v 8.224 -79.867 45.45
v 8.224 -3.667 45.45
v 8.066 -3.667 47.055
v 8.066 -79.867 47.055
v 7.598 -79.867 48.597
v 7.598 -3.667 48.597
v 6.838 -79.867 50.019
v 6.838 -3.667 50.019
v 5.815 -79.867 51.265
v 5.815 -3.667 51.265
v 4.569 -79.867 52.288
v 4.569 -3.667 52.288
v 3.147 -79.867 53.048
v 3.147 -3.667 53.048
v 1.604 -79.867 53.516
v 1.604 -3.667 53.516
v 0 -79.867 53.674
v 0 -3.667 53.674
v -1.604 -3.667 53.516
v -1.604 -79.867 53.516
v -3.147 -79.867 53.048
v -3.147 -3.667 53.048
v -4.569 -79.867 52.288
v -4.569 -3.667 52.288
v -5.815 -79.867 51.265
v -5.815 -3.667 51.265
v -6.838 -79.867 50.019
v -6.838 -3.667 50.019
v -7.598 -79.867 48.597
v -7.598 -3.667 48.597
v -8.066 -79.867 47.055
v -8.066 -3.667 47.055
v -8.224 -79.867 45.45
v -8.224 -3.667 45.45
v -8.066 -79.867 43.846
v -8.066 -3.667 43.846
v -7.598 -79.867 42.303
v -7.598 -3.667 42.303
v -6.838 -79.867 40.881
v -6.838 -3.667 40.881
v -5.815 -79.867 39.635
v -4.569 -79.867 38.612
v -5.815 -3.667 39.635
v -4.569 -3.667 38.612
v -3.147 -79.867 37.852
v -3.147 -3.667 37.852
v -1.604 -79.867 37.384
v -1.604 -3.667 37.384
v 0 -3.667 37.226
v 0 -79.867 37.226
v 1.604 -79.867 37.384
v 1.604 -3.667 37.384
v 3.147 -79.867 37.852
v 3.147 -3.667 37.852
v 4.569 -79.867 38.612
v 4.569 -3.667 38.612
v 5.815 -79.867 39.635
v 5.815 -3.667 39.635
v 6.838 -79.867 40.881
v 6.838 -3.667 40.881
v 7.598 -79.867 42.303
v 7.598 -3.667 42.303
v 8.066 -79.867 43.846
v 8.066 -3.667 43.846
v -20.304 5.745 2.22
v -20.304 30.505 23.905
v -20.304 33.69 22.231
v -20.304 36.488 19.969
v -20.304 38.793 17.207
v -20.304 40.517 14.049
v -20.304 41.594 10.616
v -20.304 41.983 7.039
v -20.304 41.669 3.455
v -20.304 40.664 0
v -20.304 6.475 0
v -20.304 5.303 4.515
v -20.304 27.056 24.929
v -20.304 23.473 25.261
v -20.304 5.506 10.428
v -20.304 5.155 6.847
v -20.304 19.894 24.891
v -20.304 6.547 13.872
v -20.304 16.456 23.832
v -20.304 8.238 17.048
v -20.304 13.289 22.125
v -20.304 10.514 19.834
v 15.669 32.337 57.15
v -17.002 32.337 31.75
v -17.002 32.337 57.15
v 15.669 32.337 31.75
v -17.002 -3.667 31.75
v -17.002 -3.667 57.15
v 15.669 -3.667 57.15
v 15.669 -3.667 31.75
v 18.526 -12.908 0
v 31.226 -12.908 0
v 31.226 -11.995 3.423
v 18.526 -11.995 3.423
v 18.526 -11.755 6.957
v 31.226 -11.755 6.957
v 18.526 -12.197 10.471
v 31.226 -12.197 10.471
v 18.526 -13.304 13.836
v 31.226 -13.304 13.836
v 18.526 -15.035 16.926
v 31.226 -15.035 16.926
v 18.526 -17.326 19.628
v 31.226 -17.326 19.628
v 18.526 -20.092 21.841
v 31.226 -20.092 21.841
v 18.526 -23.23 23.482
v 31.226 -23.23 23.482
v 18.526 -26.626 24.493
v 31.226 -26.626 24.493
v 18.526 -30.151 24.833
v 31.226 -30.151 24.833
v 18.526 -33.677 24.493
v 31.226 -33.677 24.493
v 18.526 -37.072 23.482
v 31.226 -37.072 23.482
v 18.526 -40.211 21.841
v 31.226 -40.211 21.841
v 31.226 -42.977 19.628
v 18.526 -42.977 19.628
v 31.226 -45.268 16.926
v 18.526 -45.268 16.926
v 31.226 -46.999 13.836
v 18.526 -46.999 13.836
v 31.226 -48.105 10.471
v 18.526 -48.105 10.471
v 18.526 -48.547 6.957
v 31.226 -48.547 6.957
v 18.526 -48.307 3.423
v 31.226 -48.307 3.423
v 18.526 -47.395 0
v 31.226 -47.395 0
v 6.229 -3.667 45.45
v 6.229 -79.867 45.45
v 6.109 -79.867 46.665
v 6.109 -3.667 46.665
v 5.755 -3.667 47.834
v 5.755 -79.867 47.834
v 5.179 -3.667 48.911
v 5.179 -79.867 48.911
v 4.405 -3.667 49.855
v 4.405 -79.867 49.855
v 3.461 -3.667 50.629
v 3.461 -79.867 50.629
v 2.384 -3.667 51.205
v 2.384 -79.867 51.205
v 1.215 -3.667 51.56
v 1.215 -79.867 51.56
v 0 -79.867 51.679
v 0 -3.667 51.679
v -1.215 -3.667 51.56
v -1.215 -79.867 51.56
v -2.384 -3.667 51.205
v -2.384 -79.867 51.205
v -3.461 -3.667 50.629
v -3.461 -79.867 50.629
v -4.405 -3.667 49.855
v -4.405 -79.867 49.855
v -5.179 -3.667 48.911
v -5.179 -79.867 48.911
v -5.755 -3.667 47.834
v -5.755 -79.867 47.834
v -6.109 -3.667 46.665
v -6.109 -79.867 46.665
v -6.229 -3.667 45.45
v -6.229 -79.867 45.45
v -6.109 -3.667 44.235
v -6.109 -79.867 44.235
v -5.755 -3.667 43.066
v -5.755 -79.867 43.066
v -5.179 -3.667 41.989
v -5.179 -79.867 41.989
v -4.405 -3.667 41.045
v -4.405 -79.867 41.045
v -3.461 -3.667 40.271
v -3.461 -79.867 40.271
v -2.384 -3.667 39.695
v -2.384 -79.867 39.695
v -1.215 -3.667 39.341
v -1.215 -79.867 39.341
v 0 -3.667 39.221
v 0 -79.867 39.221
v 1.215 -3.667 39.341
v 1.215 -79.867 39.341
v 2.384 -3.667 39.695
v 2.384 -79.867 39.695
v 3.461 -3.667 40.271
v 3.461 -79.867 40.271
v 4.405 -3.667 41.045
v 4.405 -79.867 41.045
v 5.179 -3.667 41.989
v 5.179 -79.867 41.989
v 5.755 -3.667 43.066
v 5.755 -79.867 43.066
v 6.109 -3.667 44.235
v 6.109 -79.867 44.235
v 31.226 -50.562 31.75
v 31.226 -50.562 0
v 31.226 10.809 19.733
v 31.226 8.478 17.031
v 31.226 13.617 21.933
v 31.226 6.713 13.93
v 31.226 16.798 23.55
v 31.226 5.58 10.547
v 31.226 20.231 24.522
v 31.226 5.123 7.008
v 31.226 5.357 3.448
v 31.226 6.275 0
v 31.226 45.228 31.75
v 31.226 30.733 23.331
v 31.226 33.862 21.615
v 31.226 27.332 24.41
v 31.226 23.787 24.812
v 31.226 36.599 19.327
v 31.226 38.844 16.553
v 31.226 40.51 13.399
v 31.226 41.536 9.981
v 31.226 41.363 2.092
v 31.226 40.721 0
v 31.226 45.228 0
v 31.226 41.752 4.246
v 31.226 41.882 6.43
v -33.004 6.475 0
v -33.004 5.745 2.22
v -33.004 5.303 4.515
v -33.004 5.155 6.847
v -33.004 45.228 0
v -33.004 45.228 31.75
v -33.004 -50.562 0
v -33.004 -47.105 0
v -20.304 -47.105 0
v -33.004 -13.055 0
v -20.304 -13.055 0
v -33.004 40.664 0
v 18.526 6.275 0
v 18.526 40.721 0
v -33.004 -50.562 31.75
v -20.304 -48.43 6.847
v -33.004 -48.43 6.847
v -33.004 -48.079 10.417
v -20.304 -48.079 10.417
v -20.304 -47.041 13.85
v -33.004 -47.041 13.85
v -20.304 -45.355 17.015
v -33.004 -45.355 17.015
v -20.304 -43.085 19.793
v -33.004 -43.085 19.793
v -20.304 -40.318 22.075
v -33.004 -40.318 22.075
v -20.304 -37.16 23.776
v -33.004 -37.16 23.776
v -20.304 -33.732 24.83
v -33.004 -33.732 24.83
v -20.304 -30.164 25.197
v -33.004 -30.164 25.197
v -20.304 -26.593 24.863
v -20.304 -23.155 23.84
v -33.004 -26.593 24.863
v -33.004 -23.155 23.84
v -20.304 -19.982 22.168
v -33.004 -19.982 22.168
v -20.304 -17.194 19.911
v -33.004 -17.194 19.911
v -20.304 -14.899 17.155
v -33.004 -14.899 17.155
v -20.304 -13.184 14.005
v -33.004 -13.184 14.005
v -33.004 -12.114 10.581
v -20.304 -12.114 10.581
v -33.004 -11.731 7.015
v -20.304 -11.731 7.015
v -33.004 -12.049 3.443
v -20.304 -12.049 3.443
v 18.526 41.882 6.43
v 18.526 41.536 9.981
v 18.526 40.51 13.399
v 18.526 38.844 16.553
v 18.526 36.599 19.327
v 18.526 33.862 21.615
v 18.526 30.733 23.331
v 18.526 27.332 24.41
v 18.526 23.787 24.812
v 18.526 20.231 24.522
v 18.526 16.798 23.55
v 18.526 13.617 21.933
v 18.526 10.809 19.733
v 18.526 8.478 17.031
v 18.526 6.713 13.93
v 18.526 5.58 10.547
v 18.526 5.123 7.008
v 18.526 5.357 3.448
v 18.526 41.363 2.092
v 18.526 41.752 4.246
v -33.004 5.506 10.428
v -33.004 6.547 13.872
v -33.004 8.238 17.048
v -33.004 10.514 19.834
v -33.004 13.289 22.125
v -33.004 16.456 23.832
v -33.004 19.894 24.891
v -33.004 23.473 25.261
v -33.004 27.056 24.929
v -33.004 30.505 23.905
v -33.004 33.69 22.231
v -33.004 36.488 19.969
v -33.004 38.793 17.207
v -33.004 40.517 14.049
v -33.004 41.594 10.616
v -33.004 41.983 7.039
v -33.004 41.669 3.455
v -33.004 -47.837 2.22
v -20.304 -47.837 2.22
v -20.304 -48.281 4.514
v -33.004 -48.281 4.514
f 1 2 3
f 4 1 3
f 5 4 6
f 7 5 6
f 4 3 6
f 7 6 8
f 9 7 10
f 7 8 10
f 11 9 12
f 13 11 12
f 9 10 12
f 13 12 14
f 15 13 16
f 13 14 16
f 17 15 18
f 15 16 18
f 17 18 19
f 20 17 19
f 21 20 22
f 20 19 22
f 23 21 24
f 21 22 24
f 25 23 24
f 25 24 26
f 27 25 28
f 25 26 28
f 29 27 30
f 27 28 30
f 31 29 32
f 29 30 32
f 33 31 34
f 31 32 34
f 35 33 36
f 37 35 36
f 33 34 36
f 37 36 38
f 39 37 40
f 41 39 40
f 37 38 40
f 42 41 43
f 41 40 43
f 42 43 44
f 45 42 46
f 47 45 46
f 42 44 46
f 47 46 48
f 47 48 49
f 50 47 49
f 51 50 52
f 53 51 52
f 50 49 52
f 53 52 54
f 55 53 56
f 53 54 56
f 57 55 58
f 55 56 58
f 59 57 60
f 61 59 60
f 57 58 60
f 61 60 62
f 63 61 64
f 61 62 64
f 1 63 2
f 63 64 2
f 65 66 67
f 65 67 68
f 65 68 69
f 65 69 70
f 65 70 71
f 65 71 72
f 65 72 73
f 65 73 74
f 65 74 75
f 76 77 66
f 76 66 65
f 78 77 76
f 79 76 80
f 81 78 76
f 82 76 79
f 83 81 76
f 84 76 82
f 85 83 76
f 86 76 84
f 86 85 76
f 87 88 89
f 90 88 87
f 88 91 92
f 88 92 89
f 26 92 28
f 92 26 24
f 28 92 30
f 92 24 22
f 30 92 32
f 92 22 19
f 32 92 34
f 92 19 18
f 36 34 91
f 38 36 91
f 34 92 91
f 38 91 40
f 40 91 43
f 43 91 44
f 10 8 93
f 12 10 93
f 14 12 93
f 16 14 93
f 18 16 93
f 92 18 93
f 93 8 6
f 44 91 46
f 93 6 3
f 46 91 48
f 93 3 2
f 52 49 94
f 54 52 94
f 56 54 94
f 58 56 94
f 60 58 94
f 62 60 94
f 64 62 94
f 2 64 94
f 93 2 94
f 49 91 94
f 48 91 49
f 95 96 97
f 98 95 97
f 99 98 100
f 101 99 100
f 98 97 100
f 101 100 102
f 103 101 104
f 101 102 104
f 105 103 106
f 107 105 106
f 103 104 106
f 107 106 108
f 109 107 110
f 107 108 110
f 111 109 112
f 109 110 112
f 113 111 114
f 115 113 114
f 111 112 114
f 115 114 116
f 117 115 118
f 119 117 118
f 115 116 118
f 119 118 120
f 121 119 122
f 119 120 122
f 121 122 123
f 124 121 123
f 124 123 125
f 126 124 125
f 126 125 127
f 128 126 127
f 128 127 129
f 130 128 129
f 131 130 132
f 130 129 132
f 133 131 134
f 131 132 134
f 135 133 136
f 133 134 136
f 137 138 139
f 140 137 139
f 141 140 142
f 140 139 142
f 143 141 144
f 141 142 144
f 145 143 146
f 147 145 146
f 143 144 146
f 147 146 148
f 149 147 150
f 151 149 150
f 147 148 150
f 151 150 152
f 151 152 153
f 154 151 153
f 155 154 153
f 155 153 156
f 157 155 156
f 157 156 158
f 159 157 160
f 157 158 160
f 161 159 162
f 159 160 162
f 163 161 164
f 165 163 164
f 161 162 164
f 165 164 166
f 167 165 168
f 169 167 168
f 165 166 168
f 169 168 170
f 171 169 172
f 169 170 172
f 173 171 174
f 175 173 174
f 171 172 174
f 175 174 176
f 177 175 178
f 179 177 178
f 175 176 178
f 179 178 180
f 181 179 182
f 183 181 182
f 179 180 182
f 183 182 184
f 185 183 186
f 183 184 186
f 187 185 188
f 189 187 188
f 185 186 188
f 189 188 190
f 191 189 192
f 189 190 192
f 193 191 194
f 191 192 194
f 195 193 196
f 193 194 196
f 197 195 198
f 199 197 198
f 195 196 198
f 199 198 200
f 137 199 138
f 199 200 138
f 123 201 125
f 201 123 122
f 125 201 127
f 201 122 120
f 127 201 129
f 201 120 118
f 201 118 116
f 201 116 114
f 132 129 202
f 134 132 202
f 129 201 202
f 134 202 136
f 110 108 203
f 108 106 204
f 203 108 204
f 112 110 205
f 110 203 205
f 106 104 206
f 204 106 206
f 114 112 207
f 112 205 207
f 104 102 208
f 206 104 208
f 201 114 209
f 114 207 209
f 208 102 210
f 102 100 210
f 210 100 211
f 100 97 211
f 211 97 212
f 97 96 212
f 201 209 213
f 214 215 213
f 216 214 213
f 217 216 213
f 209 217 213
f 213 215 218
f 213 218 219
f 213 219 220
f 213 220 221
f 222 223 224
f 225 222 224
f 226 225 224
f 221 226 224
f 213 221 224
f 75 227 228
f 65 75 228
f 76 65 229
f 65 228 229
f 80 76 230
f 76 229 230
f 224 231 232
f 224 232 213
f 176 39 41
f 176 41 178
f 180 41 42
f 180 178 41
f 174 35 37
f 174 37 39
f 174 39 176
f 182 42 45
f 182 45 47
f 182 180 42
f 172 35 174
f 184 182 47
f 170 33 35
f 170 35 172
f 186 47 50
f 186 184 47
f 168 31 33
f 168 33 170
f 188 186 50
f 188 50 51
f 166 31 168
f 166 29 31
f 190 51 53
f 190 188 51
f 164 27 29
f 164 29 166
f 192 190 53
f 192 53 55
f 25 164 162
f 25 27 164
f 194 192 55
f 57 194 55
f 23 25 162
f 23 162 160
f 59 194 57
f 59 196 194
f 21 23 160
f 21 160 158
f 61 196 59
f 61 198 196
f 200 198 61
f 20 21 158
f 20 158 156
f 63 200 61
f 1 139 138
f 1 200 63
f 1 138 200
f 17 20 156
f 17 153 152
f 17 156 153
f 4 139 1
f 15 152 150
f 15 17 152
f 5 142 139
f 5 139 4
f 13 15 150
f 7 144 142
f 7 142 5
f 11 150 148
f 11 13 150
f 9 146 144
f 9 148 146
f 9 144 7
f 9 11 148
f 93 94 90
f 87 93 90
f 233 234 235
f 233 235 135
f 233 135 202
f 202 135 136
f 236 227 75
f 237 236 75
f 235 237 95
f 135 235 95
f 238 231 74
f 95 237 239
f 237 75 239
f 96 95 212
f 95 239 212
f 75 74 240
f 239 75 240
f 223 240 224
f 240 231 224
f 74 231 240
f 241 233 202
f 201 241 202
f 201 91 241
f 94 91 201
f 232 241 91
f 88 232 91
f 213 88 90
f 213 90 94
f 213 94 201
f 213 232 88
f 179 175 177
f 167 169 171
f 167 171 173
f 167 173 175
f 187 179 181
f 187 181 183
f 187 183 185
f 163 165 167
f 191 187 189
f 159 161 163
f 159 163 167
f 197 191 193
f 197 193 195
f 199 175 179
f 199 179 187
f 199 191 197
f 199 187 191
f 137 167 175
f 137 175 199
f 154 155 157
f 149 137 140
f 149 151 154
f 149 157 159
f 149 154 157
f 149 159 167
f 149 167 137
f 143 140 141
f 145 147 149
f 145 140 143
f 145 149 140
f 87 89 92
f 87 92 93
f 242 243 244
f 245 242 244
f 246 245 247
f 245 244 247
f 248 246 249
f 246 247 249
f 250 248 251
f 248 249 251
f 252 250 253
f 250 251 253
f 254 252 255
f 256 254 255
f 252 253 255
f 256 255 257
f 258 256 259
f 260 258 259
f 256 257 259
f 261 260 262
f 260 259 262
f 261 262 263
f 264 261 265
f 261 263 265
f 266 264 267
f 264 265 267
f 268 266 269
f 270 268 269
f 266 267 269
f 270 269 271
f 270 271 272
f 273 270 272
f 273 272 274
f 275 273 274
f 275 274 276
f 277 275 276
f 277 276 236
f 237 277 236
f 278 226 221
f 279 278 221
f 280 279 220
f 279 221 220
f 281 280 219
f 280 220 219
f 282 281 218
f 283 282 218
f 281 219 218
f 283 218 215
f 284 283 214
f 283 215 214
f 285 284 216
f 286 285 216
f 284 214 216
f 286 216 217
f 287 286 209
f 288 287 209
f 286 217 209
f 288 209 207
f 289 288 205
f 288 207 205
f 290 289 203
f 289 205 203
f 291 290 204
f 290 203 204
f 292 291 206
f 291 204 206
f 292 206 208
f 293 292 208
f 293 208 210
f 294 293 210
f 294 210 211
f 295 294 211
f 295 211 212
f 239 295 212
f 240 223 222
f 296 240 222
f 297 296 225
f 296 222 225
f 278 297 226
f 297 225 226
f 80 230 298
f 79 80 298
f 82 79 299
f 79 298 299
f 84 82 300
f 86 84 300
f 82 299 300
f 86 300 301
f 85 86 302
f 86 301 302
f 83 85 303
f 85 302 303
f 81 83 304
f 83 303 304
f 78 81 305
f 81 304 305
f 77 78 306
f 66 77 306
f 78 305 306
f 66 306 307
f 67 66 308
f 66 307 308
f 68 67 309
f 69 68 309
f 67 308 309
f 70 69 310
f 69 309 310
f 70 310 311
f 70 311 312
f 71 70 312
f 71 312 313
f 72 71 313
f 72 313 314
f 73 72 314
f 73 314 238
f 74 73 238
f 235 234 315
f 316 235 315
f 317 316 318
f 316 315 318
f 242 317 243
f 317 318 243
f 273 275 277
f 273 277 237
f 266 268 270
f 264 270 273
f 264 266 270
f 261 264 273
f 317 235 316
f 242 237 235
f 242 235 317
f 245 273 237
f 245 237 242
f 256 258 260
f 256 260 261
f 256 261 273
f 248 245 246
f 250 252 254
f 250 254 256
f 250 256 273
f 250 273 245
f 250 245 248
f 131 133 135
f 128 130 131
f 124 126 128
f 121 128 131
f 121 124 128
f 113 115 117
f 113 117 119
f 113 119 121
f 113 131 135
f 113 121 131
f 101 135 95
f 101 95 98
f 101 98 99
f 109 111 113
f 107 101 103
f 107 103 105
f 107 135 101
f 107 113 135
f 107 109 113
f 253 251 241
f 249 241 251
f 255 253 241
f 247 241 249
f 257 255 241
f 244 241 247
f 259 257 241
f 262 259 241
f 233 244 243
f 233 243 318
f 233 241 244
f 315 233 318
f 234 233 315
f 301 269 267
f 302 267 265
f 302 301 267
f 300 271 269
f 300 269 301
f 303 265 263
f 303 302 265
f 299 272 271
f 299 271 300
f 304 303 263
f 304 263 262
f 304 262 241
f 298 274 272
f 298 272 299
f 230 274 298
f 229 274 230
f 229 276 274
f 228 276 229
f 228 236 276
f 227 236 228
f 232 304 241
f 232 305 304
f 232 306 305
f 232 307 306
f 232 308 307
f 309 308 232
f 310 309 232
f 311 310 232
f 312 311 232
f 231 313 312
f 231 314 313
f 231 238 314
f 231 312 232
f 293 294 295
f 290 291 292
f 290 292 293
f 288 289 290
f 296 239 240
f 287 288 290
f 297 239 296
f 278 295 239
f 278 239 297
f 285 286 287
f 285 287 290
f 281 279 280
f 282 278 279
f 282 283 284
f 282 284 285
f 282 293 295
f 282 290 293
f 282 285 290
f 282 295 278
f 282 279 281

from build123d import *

# Parameters (mm, degrees)
F0_W      = 64.230248332
F0_H      = 95.7897491753
F1_DEPTH  = 31.75
F4_DEPTH  = 12.7
F5_DEPTH  = 12.7
F6_W      = 32.6707493514
F6_H      = 36.0044999979
F7_DEPTH  = 25.4
F8_R      = 8.2239975994
F9_DEPTH  = 76.2
F10_R     = 6.2290995739
F11_DEPTH = 76.2


with BuildPart() as f1:
    # F0 (on Top) → F1 (new body)
    with BuildSketch(Plane.XY):
        with Locations((-0.8889995515, -2.6670005172)):
            Rectangle(F0_W, F0_H)
    extrude(amount=F1_DEPTH)

    # F2 (on face) → F4 (cut)
    with BuildSketch(Plane.YZ.offset(31.2261246145)):
        with BuildLine():
            Line((-47.3948020572, 0), (-12.907678998, 0))
            ThreePointArc((-12.907678998, 0), (-30.1512405276, 24.8333887155), (-47.3948020572, 0))
        make_face()
        with BuildLine():
            ThreePointArc((40.7211401539, 0), (41.5896545425, 3.1629956827), (41.8822641726, 6.4299879596))
            ThreePointArc((41.8822641726, 6.4299879596), (20.2309505583, 24.521699667), (6.2747455163, 0))
            Line((6.2747455163, 0), (40.7211401539, 0))
        make_face()
    extrude(amount=-F4_DEPTH, mode=Mode.SUBTRACT)

    # F3 (on face) → F5 (cut)
    with BuildSketch(Plane(origin=(-33.0041237175, 0, 0), x_dir=(0, -1, 0), z_dir=(-1, 0, 0))):
        with BuildLine():
            ThreePointArc((-6.4749563765, 0), (-5.4877667655, 3.3604332928), (-5.1546871083, 6.8469950929))
            ThreePointArc((-5.1546871083, 6.8469950929), (-27.055845807, 24.9285123344), (-40.6636116374, 0))
            Line((-40.6636116374, 0), (-6.4749563765, 0))
        make_face()
        with BuildLine():
            ThreePointArc((48.4297908844, 6.8469950929), (26.592859866, 24.8625205102), (13.0552904295, 0))
            Line((13.0552904295, 0), (47.1045045567, 0))
            ThreePointArc((47.1045045567, 0), (48.0954229104, 3.3599574658), (48.4297908844, 6.8469950929))
        make_face()
    extrude(amount=-F5_DEPTH, mode=Mode.SUBTRACT)

    # F6 (on face) → F7 (join)
    with BuildSketch(Plane.XY.offset(31.75)):
        with Locations((-0.6667496637, 14.3351249862)):
            Rectangle(F6_W, F6_H)
    extrude(amount=F7_DEPTH)

    # F8 (on face) → F9 (join)
    with BuildSketch(Plane.XZ.offset(3.6671250127)):
        with Locations((0, 45.4501248896)):
            Circle(F8_R)
    extrude(amount=F9_DEPTH)

    # F10 (on face) → F11 (cut)
    with BuildSketch(Plane.XZ.offset(79.8671250127)):
        with Locations((0, 45.4501248896)):
            Circle(F10_R)
    extrude(amount=-F11_DEPTH, mode=Mode.SUBTRACT)


solid = f1.part
